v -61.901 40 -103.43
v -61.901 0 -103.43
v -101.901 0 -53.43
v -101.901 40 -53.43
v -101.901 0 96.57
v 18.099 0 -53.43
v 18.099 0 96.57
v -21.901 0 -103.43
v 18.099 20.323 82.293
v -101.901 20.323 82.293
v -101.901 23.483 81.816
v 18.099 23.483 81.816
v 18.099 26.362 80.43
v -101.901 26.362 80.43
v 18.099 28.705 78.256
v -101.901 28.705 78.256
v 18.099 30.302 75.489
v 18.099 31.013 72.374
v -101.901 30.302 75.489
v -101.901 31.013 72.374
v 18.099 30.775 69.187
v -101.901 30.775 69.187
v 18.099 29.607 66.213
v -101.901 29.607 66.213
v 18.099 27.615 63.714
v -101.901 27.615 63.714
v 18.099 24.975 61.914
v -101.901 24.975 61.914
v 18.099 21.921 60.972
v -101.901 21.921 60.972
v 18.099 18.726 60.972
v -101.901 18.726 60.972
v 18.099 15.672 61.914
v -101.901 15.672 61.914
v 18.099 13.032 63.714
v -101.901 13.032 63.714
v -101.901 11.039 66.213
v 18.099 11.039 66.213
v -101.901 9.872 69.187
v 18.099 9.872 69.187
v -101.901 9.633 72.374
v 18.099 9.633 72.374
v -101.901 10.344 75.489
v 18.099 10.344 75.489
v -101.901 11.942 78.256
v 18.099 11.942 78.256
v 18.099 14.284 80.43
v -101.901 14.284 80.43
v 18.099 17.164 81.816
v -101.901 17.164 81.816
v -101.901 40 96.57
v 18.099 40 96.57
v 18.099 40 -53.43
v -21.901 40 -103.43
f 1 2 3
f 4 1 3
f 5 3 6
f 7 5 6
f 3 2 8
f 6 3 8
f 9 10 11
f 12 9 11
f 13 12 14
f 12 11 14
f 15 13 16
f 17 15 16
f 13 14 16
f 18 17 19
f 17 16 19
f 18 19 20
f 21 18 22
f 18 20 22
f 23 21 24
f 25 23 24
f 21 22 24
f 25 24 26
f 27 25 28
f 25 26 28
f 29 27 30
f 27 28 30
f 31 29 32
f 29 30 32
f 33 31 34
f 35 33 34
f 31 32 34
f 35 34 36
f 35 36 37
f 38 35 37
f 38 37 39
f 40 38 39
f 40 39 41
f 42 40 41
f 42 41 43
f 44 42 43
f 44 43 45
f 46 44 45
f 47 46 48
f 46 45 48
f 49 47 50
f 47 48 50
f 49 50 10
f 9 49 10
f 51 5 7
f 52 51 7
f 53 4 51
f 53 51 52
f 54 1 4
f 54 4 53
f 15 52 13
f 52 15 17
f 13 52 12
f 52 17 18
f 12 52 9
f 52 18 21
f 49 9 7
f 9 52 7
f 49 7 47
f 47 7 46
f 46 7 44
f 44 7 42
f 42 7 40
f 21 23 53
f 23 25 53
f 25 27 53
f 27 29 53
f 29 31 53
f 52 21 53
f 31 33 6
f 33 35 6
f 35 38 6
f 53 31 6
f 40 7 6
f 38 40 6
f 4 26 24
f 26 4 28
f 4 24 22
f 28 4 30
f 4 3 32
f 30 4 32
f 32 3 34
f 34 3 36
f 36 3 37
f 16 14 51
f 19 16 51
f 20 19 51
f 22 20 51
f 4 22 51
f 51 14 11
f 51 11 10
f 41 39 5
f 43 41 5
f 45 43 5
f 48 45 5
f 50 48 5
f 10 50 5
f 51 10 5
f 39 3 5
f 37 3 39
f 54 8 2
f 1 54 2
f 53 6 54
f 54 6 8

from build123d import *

# Parameters (mm, degrees)
BOSS_EXTRUDE4_DEPTH = 40
SKETCH5_R           = 10.720024077
CUT_EXTRUDE1_DEPTH  = 120


with BuildPart() as part:
    # Sketch1 → Boss-Extrude4 (new body)
    with BuildSketch(Plane(origin=(0, 0, 0), x_dir=(1, 0, 0), z_dir=(0, 1, 0))):
        Polygon((-101.900826446, 53.429752066), (-101.900826446, -96.570247934), (18.099173554, -96.570247934), (18.099173554, 53.429752066), (-21.900826446, 103.429752066), (-41.900826446, 103.429752066), (-61.900826446, 103.429752066), align=None)
    extrude(amount=BOSS_EXTRUDE4_DEPTH)

    # Sketch5 → Cut-Extrude1 (cut)
    with BuildSketch(Plane.ZY.offset(101.900826446)):
        with Locations((71.572647324, 20.323286204)):
            Circle(SKETCH5_R)
    extrude(amount=-CUT_EXTRUDE1_DEPTH, mode=Mode.SUBTRACT)


solid = part.part
